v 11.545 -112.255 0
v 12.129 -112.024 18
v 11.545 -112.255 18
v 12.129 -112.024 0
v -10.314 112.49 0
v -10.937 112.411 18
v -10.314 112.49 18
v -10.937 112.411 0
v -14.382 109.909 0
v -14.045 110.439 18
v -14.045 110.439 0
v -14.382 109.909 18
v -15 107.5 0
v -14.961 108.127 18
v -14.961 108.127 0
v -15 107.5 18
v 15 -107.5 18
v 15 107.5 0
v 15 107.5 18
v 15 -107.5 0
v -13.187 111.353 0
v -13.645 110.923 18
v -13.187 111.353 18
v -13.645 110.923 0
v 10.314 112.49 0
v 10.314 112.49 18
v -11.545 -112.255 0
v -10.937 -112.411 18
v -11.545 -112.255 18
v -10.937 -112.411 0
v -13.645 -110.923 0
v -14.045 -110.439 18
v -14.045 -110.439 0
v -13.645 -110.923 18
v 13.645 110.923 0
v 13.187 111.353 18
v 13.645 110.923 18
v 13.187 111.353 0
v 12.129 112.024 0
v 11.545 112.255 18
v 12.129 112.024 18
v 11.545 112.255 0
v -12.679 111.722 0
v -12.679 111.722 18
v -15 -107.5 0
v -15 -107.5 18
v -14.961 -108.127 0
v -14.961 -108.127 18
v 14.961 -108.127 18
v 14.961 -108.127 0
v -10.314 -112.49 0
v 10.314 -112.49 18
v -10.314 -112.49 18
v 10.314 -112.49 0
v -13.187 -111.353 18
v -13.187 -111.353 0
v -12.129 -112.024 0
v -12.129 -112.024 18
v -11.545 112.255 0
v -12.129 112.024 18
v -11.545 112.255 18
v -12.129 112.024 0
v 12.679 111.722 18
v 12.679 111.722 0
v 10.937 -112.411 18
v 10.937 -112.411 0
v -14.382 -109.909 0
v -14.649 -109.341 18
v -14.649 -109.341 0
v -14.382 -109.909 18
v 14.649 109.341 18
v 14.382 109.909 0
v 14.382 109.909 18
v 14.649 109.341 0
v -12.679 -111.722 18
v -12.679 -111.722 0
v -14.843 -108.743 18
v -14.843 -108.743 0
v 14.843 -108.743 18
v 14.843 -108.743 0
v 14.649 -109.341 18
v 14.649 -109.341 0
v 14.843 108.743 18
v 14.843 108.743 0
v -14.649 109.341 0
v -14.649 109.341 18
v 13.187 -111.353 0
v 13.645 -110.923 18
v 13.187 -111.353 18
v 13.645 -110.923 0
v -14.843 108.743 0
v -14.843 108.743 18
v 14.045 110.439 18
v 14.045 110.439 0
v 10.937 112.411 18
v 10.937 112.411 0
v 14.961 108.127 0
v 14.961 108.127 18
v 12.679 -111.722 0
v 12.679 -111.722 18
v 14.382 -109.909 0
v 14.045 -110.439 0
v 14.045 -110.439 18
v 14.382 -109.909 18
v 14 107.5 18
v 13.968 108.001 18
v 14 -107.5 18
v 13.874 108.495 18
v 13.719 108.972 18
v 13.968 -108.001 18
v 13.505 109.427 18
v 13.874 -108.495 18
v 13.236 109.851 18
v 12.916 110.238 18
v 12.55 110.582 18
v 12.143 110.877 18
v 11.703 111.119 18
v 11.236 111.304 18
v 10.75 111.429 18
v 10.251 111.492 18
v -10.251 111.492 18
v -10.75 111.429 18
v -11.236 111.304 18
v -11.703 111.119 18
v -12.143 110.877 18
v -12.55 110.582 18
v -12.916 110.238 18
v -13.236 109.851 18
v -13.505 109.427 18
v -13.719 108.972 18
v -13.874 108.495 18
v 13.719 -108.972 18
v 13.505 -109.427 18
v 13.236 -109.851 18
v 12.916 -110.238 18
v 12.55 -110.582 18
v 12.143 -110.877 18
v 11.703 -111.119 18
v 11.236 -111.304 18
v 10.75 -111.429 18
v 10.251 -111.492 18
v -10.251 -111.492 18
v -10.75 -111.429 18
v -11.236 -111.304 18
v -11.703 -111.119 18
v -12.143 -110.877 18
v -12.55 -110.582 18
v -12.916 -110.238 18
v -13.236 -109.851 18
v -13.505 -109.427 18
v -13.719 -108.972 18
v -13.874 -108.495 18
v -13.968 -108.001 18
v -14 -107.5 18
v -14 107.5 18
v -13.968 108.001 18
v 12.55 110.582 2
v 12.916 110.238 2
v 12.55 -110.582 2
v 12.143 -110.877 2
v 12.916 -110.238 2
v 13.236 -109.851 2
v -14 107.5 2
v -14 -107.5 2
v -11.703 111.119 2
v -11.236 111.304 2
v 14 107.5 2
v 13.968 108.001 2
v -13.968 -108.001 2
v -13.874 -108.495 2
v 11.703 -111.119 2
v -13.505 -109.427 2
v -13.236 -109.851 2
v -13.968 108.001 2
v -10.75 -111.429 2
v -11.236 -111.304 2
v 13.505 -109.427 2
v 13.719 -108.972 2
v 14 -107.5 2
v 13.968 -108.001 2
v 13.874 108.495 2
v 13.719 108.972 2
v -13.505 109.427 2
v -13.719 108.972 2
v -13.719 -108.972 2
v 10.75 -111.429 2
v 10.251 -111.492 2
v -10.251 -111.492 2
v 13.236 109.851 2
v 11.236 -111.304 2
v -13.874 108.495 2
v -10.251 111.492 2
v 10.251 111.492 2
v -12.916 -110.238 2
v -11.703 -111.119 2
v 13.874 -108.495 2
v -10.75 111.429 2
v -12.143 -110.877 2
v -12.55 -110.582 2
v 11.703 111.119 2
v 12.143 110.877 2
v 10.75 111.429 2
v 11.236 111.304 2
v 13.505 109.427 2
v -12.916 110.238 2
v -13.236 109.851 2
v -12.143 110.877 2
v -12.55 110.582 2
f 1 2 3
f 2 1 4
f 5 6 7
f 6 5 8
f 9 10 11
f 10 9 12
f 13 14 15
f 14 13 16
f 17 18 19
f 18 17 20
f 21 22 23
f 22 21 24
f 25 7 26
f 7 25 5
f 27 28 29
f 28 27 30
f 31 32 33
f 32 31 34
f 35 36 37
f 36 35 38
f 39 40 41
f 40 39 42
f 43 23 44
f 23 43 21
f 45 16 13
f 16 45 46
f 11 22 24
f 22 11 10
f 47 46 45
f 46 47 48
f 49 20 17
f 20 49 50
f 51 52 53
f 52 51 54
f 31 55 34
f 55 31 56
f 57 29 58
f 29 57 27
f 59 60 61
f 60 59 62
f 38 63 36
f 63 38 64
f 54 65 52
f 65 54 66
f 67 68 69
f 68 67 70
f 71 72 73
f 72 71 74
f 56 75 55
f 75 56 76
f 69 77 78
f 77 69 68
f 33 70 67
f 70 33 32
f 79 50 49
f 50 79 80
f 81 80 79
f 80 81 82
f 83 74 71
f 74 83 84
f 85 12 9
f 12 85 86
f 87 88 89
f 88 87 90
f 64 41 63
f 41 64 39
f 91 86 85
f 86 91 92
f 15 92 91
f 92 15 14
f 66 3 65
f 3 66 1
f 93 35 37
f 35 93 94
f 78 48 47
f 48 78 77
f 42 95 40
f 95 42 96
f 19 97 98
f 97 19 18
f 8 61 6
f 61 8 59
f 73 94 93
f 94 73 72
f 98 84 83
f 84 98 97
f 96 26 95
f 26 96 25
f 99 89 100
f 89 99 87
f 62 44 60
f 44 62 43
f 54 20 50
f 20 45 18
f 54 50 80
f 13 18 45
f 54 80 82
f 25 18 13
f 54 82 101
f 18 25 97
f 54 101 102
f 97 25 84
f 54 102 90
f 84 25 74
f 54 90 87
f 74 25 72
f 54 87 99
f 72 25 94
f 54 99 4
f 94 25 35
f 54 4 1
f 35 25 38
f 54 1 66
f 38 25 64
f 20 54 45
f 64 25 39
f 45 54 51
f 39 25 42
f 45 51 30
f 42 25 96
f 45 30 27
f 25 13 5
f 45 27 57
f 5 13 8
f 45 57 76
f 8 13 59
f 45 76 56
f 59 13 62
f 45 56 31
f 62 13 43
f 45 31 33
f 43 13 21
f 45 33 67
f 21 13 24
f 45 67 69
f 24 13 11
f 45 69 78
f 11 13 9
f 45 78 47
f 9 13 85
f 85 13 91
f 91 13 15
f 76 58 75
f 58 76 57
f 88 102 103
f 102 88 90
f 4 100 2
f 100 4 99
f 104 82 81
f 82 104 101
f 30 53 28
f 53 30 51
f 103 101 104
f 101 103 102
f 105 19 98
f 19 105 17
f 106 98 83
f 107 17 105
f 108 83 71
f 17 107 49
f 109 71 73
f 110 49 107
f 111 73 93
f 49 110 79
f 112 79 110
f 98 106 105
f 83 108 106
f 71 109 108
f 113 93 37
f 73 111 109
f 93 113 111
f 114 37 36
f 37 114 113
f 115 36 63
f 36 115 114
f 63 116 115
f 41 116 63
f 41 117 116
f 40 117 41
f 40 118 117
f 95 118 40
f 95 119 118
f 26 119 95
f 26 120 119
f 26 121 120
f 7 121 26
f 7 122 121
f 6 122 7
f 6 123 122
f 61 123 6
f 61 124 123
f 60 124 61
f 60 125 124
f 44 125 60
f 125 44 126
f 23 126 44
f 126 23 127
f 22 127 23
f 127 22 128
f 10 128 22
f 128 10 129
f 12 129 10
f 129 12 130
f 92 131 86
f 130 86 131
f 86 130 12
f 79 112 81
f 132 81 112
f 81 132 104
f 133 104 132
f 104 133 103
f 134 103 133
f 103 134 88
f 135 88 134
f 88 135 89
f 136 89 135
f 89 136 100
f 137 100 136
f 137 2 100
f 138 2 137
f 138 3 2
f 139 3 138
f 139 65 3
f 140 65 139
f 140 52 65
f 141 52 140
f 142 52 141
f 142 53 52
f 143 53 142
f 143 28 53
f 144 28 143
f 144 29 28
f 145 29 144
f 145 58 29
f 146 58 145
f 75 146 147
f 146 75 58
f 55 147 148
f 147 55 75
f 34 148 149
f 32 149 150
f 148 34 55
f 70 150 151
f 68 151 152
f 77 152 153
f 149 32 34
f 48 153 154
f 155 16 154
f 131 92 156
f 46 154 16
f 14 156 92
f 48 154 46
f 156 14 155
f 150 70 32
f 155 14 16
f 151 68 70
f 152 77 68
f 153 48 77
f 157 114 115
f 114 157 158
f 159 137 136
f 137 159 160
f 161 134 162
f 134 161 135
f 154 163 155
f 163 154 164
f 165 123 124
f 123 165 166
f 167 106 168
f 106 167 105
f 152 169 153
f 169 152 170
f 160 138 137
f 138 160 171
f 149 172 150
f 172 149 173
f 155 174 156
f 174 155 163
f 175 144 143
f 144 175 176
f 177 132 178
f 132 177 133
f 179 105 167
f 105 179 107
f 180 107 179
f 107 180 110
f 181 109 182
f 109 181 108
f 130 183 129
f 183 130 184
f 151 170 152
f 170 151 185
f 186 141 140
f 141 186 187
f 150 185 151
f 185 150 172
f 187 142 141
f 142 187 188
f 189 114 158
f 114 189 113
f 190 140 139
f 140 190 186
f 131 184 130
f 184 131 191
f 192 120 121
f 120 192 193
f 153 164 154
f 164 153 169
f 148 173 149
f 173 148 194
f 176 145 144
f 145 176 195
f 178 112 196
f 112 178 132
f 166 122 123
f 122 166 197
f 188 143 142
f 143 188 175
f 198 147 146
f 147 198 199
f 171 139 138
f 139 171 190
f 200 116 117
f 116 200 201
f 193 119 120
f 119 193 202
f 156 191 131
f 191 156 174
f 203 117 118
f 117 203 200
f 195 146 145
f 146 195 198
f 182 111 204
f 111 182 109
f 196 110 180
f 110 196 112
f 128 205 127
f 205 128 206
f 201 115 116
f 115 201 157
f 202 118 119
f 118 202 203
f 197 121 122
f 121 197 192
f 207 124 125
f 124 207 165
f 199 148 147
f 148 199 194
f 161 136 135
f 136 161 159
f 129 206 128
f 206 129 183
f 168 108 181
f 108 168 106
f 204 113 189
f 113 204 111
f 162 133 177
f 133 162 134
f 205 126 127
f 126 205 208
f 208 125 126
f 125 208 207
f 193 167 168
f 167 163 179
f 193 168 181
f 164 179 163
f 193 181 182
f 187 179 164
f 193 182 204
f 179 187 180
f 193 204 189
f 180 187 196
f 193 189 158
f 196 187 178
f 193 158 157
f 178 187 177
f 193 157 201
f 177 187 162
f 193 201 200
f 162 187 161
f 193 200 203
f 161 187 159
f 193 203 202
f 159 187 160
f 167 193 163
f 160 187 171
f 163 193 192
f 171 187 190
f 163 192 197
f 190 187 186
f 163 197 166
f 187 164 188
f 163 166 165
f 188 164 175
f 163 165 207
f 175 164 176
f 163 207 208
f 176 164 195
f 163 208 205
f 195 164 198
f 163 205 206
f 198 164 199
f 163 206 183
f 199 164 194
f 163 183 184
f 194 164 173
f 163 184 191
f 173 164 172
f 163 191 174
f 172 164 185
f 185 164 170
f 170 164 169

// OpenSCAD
$fn = 50;


difference() {
	union() {
		hull() {
			translate(v = [-10.0000000000, 107.5000000000, 0]) {
				cylinder(h = 18, r = 5);
			}
			translate(v = [10.0000000000, 107.5000000000, 0]) {
				cylinder(h = 18, r = 5);
			}
			translate(v = [-10.0000000000, -107.5000000000, 0]) {
				cylinder(h = 18, r = 5);
			}
			translate(v = [10.0000000000, -107.5000000000, 0]) {
				cylinder(h = 18, r = 5);
			}
		}
	}
	union() {
		translate(v = [0, 0, 2]) {
			hull() {
				translate(v = [-10.0000000000, 107.5000000000, 0]) {
					cylinder(h = 16, r = 4);
				}
				translate(v = [10.0000000000, 107.5000000000, 0]) {
					cylinder(h = 16, r = 4);
				}
				translate(v = [-10.0000000000, -107.5000000000, 0]) {
					cylinder(h = 16, r = 4);
				}
				translate(v = [10.0000000000, -107.5000000000, 0]) {
					cylinder(h = 16, r = 4);
				}
			}
		}
	}
}
